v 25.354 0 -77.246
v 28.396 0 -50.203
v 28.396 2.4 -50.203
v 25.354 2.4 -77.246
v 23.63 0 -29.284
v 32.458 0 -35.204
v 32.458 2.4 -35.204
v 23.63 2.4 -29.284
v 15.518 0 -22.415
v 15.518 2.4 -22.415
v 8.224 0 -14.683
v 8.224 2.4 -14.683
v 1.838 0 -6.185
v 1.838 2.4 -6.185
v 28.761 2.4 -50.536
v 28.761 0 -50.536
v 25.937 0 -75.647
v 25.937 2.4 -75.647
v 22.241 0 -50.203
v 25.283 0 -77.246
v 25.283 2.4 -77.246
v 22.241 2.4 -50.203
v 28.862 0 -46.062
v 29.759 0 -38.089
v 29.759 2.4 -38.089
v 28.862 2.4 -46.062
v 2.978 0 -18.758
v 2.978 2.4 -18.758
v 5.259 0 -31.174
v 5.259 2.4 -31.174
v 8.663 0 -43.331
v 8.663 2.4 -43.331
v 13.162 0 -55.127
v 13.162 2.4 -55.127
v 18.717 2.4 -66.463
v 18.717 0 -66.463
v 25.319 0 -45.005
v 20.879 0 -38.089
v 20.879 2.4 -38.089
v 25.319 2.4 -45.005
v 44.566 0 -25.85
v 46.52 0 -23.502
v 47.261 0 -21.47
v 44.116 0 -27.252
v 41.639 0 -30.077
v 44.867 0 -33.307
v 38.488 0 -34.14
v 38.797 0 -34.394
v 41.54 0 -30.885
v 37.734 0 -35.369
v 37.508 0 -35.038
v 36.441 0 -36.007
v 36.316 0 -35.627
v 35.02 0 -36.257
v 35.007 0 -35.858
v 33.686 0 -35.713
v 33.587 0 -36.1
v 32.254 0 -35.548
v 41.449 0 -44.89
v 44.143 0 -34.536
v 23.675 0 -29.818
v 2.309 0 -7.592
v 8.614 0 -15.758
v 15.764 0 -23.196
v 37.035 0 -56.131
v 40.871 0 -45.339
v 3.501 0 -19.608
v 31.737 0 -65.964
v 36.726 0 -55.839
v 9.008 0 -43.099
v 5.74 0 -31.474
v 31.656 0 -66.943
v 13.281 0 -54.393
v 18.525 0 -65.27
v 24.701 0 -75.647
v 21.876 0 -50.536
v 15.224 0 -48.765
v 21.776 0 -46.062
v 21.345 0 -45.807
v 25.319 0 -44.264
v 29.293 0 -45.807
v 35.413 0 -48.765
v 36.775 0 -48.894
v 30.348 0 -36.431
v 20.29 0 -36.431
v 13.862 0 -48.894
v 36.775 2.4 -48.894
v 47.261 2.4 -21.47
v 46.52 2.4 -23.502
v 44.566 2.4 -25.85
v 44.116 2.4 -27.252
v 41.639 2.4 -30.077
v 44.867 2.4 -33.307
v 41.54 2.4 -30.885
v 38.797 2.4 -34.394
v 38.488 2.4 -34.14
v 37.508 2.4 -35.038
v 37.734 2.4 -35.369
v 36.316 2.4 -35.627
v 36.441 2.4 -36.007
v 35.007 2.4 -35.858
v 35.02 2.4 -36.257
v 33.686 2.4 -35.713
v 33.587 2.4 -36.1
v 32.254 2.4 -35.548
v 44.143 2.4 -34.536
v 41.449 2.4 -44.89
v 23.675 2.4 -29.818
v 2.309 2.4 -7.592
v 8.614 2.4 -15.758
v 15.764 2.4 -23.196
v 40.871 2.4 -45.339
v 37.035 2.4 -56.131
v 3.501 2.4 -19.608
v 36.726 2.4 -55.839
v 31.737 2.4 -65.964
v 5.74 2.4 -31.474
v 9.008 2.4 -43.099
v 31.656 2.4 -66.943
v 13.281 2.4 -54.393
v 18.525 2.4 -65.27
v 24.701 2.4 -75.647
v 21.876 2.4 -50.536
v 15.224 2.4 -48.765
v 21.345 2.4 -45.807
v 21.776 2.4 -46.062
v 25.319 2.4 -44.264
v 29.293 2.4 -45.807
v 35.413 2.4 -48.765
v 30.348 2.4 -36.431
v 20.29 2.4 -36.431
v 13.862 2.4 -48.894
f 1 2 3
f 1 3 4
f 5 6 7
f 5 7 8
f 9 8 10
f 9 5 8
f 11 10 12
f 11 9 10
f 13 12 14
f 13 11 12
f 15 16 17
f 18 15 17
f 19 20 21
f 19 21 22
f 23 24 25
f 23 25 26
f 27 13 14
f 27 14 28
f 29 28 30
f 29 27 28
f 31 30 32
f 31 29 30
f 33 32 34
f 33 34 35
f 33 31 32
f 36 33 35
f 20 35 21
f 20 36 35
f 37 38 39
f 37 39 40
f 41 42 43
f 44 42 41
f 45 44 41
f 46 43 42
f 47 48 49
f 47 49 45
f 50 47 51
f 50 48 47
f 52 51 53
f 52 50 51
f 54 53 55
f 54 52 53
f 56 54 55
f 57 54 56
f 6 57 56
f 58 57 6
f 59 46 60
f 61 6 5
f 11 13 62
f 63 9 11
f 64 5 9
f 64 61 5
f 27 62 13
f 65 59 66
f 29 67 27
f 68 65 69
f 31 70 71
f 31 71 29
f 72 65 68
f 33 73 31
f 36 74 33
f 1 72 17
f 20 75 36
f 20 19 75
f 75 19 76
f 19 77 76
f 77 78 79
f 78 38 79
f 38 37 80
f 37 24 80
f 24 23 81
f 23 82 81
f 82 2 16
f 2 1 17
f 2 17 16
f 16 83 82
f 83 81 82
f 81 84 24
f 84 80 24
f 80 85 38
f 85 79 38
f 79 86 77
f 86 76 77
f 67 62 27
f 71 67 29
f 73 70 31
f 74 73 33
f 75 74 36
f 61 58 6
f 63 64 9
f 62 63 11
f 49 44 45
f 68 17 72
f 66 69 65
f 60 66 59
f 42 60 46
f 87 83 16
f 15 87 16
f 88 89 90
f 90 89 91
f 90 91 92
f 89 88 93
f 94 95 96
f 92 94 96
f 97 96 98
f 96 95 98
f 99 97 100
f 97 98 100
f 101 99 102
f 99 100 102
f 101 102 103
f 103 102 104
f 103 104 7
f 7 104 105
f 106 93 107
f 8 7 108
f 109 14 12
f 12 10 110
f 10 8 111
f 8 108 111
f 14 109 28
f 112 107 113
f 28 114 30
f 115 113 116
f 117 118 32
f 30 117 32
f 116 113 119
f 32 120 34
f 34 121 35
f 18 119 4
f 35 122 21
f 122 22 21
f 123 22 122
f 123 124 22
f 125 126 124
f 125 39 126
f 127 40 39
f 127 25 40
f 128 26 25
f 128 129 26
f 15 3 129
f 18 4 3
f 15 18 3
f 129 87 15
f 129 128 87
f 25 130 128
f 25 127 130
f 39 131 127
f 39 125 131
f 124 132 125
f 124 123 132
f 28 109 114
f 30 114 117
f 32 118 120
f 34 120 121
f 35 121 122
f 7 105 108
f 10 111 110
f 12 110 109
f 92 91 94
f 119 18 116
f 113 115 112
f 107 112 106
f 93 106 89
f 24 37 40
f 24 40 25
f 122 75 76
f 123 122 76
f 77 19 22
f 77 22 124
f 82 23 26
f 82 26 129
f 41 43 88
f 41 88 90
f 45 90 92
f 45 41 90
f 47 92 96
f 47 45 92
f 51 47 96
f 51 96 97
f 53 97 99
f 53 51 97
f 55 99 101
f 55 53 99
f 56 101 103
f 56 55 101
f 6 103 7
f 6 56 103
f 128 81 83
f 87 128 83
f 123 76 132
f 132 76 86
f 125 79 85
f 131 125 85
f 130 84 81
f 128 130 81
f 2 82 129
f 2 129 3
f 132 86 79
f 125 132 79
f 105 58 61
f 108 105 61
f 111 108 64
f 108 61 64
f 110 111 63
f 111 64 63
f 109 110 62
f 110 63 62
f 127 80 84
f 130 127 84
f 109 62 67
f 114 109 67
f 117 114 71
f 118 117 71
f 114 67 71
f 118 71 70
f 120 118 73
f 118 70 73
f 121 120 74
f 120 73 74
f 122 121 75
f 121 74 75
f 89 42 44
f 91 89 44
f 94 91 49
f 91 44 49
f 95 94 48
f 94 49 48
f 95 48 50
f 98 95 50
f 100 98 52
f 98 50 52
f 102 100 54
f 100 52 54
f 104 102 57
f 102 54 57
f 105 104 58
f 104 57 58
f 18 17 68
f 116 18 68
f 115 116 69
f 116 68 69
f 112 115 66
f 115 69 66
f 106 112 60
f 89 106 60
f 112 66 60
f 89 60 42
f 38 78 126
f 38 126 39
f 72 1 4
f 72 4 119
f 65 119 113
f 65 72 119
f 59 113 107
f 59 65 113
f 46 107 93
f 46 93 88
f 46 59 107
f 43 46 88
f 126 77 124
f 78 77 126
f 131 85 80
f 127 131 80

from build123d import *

# Parameters (mm, degrees)
BOSS_EXTRUDE1_DEPTH = 2.4


with BuildPart() as part:
    # Sketch2 → Boss-Extrude1 (new body)
    with BuildSketch(Plane(origin=(0, 0, 0), x_dir=(1, 0, 0), z_dir=(0, 1, 0))):
        with BuildLine():
            Line((25.28293267, 77.245611288), (22.241395548, 50.202851698))
            Line((22.241395548, 50.202851698), (15.224426897, 48.764665996))
            Line((15.224426897, 48.764665996), (21.775683691, 46.062138205))
            Line((21.775683691, 46.062138205), (20.878911595, 38.088803933))
            Line((20.878911595, 38.088803933), (25.3187138, 45.004925816))
            Line((25.3187138, 45.004925816), (29.758516004, 38.088803933))
            Line((29.758516004, 38.088803933), (28.861743908, 46.062138205))
            Line((28.861743908, 46.062138205), (35.413000702, 48.764665996))
            Line((35.413000702, 48.764665996), (28.396032051, 50.202851698))
            Line((28.396032051, 50.202851698), (25.354494929, 77.245611288))
            ThreePointArc((25.354494929, 77.245611288), (39.364716338, 50.558630658), (47.260701361, 21.470236759))
            ThreePointArc((47.260701361, 21.470236759), (43.131494569, 27.98329808), (38.487800716, 34.14011738))
            ThreePointArc((38.487800716, 34.14011738), (35.669967354, 35.788554713), (32.458155801, 35.203920598))
            ThreePointArc((32.458155801, 35.203920598), (15.517725775, 22.41503931), (1.838377838, 6.185156559))
            ThreePointArc((1.838377838, 6.185156559), (8.663390647, 43.331109422), (25.28293267, 77.245611288))
        make_face()
        with BuildLine():
            Line((28.761044533, 50.536354524), (25.936821585, 75.646941422))
            ThreePointArc((25.936821585, 75.646941422), (38.906137272, 50.63149335), (46.519959977, 23.502072134))
            ThreePointArc((46.519959977, 23.502072134), (42.849248676, 29.083132434), (38.797114504, 34.393741079))
            ThreePointArc((38.797114504, 34.393741079), (35.739465536, 36.182470951), (32.254308319, 35.548080741))
            ThreePointArc((32.254308319, 35.548080741), (15.763956049, 23.195791569), (2.309144184, 7.59198423))
            ThreePointArc((2.309144184, 7.59198423), (9.008069243, 43.099003198), (24.700606015, 75.646941422))
            Line((24.700606015, 75.646941422), (21.876383066, 50.536354524))
            Line((21.876383066, 50.536354524), (13.862415181, 48.893825592))
            Line((13.862415181, 48.893825592), (21.344500988, 45.807311742))
            Line((21.344500988, 45.807311742), (20.289917479, 36.430852681))
            Line((20.289917479, 36.430852681), (25.3187138, 44.264482803))
            Line((25.3187138, 44.264482803), (30.34751012, 36.430852681))
            Line((30.34751012, 36.430852681), (29.292926611, 45.807311742))
            Line((29.292926611, 45.807311742), (36.775012418, 48.893825592))
            Line((36.775012418, 48.893825592), (28.761044533, 50.536354524))
        make_face(mode=Mode.SUBTRACT)
    extrude(amount=BOSS_EXTRUDE1_DEPTH)


solid = part.part
